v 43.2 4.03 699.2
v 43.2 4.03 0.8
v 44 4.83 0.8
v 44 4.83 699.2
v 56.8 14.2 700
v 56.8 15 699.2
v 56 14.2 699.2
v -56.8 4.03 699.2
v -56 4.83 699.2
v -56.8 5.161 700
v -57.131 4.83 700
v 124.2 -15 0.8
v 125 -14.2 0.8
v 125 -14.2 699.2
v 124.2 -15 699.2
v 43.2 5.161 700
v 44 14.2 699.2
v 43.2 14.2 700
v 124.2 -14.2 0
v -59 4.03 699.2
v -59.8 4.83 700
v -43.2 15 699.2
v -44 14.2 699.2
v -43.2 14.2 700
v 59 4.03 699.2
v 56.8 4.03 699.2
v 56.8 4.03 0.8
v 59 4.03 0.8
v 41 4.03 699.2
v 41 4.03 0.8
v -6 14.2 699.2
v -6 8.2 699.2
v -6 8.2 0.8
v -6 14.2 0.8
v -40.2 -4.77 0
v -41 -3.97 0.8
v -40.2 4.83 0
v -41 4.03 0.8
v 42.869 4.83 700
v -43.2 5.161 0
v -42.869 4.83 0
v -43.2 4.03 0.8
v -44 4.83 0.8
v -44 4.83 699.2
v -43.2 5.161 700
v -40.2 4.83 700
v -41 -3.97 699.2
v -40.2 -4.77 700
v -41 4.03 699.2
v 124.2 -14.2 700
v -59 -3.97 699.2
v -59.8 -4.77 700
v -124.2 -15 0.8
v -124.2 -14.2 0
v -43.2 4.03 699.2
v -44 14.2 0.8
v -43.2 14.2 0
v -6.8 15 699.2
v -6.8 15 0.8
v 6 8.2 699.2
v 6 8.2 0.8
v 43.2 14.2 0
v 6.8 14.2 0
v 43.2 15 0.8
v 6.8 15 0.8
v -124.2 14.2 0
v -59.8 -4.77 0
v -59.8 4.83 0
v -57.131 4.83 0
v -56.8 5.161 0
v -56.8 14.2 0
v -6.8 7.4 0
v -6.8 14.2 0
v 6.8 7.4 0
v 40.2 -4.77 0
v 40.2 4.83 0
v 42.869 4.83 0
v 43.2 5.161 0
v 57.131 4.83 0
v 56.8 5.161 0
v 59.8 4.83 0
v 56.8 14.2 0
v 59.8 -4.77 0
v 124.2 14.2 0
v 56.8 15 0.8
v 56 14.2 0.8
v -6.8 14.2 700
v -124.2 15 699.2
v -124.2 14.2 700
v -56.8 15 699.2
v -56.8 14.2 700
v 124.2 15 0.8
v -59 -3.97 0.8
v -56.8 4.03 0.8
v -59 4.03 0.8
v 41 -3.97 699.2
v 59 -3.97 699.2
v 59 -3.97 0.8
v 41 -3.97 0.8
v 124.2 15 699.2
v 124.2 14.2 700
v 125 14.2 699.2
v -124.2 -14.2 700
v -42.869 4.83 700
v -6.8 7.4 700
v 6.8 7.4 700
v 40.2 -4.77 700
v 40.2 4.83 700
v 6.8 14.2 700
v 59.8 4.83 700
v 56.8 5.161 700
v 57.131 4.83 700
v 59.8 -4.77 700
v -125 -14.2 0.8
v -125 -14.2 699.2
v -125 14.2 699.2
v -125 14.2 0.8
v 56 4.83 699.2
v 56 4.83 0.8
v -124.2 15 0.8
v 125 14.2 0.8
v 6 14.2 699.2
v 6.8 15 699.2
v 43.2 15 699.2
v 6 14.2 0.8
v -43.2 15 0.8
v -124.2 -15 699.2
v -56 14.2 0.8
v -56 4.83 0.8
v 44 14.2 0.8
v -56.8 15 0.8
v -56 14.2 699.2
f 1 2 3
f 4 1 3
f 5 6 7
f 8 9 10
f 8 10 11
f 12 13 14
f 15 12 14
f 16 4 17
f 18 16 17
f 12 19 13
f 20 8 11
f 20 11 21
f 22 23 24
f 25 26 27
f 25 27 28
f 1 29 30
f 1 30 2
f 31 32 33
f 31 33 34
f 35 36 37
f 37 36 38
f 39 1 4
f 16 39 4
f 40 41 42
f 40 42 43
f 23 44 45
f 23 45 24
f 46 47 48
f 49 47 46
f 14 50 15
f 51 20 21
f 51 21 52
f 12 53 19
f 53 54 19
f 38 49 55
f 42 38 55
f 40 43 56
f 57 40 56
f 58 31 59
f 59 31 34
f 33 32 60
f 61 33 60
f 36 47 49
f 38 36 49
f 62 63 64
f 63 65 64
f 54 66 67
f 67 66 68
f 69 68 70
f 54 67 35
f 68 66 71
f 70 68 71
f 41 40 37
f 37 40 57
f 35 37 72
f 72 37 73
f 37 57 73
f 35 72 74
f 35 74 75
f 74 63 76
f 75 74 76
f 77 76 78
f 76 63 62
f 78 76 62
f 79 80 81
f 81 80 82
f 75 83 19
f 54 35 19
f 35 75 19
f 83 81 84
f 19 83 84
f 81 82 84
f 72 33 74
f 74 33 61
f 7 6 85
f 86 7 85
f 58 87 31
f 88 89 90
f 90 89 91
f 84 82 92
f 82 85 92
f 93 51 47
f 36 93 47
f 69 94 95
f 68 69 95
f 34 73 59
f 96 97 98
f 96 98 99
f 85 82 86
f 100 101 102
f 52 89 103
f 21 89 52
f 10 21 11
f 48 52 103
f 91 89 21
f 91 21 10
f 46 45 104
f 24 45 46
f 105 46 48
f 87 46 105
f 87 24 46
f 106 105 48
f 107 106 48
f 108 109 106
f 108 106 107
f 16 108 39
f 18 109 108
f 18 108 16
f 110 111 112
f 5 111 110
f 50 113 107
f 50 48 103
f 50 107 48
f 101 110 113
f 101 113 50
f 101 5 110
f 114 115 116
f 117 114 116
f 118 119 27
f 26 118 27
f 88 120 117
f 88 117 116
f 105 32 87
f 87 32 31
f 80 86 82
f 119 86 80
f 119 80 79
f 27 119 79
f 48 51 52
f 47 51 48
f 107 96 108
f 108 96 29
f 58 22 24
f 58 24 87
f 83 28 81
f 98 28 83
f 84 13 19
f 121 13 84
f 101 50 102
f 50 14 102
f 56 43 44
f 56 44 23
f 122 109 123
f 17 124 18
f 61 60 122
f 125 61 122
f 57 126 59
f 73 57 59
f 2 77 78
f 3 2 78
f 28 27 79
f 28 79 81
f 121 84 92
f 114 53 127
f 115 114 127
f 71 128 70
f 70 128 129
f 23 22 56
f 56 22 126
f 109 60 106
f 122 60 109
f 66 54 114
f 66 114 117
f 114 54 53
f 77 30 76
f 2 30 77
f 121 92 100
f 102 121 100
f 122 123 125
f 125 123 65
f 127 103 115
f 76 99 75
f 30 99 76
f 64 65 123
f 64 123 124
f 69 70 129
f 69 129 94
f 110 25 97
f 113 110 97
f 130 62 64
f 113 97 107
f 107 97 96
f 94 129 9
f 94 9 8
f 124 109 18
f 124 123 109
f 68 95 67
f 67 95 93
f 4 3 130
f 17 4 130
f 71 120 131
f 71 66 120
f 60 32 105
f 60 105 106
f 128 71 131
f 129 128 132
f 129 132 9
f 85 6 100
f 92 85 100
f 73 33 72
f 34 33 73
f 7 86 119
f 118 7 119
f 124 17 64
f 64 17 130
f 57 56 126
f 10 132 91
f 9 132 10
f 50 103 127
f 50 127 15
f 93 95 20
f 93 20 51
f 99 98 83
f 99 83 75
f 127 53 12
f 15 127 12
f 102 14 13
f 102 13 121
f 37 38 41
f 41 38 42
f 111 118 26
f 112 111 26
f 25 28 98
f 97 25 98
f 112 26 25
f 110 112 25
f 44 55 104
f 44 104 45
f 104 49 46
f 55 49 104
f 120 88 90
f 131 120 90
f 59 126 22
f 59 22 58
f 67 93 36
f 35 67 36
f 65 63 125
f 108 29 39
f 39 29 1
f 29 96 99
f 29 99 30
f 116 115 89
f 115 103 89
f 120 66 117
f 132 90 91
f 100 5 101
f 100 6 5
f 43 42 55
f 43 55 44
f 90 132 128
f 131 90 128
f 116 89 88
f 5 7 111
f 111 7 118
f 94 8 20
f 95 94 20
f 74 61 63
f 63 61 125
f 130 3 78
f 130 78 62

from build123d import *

# Parameters (mm, degrees)
CROQUIS1_W              = 250
CROQUIS1_H              = 30
SALIENTE_EXTRUIR1_DEPTH = 700
CROQUIS3_W              = 12
CROQUIS3_H              = 13.6
CORTAR_EXTRUIR1_DEPTH   = 794.2
CHAFL_N1_SIZE           = 0.8


with BuildPart() as part:
    # Croquis1 → Saliente-Extruir1 (new body)
    with BuildSketch(Plane.XY):
        Rectangle(CROQUIS1_W, CROQUIS1_H)
    extrude(amount=SALIENTE_EXTRUIR1_DEPTH)

    # Croquis3 → Cortar-Extruir1 (cut)
    with BuildSketch(Plane.XY.offset(700)):
        Polygon((-56, 15), (-56, 4.83), (-56.8, 4.03), (-59, 4.03), (-59, -3.97), (-41, -3.97), (-41, 4.03), (-43.2, 4.03), (-44, 4.83), (-44, 15), align=None)
        Polygon((41, -3.97), (41, 4.03), (43.2, 4.03), (44, 4.83), (44, 15), (56, 15), (56, 4.83), (56.8, 4.03), (59, 4.03), (59, -3.97), align=None)
        with Locations((0, 15)):
            Rectangle(CROQUIS3_W, CROQUIS3_H)
    extrude(amount=-CORTAR_EXTRUIR1_DEPTH, mode=Mode.SUBTRACT)

    # Chaflán1
    chafl_n1_edges = [part.edges().sort_by_distance(p)[0] for p in [
        (125, 0, 700),
        (90.5, 15, 700),
        (-90.5, 15, 0),
        (-56, 9.915, 0),
        (-56.4, 4.43, 0),
        (-57.9, 4.03, 0),
        (-59, 0.03, 0),
        (-50, -3.97, 0),
        (-41, 0.03, 0),
        (-42.1, 4.03, 0),
        (-43.6, 4.43, 0),
        (-44, 9.915, 0),
        (-90.5, 15, 700),
        (-56, 15, 350),
        (-44, 15, 350),
        (-56, 9.915, 700),
        (-56.4, 4.43, 700),
        (-57.9, 4.03, 700),
        (-59, 0.03, 700),
        (-50, -3.97, 700),
        (-41, 0.03, 700),
        (-42.1, 4.03, 700),
        (-43.6, 4.43, 700),
        (-44, 9.915, 700),
        (-125, 0, 700),
        (90.5, 15, 0),
        (125, 0, 0),
        (0, -15, 0),
        (25, 15, 0),
        (59, 0.03, 0),
        (57.9, 4.03, 0),
        (56.4, 4.43, 0),
        (56, 9.915, 0),
        (50, -3.97, 0),
        (41, 0.03, 0),
        (42.1, 4.03, 0),
        (43.6, 4.43, 0),
        (-125, 0, 0),
        (44, 9.915, 0),
        (25, 15, 700),
        (44, 15, 350),
        (56, 15, 350),
        (50, -3.97, 700),
        (59, 0.03, 700),
        (0, -15, 700),
        (57.9, 4.03, 700),
        (56.4, 4.43, 700),
        (56, 9.915, 700),
        (44, 9.915, 700),
        (43.6, 4.43, 700),
        (42.1, 4.03, 700),
        (41, 0.03, 700),
        (-125, 15, 350),
        (125, 15, 350),
        (125, -15, 350),
        (-125, -15, 350),
        (-25, 15, 0),
        (0, 8.2, 0),
        (6, 11.6, 0),
        (-6, 11.6, 0),
        (-25, 15, 700),
        (6, 11.6, 700),
        (-6, 11.6, 700),
        (0, 8.2, 700),
        (-6, 15, 350),
        (6, 15, 350),
    ]]
    chamfer(chafl_n1_edges, length=CHAFL_N1_SIZE)


solid = part.part
